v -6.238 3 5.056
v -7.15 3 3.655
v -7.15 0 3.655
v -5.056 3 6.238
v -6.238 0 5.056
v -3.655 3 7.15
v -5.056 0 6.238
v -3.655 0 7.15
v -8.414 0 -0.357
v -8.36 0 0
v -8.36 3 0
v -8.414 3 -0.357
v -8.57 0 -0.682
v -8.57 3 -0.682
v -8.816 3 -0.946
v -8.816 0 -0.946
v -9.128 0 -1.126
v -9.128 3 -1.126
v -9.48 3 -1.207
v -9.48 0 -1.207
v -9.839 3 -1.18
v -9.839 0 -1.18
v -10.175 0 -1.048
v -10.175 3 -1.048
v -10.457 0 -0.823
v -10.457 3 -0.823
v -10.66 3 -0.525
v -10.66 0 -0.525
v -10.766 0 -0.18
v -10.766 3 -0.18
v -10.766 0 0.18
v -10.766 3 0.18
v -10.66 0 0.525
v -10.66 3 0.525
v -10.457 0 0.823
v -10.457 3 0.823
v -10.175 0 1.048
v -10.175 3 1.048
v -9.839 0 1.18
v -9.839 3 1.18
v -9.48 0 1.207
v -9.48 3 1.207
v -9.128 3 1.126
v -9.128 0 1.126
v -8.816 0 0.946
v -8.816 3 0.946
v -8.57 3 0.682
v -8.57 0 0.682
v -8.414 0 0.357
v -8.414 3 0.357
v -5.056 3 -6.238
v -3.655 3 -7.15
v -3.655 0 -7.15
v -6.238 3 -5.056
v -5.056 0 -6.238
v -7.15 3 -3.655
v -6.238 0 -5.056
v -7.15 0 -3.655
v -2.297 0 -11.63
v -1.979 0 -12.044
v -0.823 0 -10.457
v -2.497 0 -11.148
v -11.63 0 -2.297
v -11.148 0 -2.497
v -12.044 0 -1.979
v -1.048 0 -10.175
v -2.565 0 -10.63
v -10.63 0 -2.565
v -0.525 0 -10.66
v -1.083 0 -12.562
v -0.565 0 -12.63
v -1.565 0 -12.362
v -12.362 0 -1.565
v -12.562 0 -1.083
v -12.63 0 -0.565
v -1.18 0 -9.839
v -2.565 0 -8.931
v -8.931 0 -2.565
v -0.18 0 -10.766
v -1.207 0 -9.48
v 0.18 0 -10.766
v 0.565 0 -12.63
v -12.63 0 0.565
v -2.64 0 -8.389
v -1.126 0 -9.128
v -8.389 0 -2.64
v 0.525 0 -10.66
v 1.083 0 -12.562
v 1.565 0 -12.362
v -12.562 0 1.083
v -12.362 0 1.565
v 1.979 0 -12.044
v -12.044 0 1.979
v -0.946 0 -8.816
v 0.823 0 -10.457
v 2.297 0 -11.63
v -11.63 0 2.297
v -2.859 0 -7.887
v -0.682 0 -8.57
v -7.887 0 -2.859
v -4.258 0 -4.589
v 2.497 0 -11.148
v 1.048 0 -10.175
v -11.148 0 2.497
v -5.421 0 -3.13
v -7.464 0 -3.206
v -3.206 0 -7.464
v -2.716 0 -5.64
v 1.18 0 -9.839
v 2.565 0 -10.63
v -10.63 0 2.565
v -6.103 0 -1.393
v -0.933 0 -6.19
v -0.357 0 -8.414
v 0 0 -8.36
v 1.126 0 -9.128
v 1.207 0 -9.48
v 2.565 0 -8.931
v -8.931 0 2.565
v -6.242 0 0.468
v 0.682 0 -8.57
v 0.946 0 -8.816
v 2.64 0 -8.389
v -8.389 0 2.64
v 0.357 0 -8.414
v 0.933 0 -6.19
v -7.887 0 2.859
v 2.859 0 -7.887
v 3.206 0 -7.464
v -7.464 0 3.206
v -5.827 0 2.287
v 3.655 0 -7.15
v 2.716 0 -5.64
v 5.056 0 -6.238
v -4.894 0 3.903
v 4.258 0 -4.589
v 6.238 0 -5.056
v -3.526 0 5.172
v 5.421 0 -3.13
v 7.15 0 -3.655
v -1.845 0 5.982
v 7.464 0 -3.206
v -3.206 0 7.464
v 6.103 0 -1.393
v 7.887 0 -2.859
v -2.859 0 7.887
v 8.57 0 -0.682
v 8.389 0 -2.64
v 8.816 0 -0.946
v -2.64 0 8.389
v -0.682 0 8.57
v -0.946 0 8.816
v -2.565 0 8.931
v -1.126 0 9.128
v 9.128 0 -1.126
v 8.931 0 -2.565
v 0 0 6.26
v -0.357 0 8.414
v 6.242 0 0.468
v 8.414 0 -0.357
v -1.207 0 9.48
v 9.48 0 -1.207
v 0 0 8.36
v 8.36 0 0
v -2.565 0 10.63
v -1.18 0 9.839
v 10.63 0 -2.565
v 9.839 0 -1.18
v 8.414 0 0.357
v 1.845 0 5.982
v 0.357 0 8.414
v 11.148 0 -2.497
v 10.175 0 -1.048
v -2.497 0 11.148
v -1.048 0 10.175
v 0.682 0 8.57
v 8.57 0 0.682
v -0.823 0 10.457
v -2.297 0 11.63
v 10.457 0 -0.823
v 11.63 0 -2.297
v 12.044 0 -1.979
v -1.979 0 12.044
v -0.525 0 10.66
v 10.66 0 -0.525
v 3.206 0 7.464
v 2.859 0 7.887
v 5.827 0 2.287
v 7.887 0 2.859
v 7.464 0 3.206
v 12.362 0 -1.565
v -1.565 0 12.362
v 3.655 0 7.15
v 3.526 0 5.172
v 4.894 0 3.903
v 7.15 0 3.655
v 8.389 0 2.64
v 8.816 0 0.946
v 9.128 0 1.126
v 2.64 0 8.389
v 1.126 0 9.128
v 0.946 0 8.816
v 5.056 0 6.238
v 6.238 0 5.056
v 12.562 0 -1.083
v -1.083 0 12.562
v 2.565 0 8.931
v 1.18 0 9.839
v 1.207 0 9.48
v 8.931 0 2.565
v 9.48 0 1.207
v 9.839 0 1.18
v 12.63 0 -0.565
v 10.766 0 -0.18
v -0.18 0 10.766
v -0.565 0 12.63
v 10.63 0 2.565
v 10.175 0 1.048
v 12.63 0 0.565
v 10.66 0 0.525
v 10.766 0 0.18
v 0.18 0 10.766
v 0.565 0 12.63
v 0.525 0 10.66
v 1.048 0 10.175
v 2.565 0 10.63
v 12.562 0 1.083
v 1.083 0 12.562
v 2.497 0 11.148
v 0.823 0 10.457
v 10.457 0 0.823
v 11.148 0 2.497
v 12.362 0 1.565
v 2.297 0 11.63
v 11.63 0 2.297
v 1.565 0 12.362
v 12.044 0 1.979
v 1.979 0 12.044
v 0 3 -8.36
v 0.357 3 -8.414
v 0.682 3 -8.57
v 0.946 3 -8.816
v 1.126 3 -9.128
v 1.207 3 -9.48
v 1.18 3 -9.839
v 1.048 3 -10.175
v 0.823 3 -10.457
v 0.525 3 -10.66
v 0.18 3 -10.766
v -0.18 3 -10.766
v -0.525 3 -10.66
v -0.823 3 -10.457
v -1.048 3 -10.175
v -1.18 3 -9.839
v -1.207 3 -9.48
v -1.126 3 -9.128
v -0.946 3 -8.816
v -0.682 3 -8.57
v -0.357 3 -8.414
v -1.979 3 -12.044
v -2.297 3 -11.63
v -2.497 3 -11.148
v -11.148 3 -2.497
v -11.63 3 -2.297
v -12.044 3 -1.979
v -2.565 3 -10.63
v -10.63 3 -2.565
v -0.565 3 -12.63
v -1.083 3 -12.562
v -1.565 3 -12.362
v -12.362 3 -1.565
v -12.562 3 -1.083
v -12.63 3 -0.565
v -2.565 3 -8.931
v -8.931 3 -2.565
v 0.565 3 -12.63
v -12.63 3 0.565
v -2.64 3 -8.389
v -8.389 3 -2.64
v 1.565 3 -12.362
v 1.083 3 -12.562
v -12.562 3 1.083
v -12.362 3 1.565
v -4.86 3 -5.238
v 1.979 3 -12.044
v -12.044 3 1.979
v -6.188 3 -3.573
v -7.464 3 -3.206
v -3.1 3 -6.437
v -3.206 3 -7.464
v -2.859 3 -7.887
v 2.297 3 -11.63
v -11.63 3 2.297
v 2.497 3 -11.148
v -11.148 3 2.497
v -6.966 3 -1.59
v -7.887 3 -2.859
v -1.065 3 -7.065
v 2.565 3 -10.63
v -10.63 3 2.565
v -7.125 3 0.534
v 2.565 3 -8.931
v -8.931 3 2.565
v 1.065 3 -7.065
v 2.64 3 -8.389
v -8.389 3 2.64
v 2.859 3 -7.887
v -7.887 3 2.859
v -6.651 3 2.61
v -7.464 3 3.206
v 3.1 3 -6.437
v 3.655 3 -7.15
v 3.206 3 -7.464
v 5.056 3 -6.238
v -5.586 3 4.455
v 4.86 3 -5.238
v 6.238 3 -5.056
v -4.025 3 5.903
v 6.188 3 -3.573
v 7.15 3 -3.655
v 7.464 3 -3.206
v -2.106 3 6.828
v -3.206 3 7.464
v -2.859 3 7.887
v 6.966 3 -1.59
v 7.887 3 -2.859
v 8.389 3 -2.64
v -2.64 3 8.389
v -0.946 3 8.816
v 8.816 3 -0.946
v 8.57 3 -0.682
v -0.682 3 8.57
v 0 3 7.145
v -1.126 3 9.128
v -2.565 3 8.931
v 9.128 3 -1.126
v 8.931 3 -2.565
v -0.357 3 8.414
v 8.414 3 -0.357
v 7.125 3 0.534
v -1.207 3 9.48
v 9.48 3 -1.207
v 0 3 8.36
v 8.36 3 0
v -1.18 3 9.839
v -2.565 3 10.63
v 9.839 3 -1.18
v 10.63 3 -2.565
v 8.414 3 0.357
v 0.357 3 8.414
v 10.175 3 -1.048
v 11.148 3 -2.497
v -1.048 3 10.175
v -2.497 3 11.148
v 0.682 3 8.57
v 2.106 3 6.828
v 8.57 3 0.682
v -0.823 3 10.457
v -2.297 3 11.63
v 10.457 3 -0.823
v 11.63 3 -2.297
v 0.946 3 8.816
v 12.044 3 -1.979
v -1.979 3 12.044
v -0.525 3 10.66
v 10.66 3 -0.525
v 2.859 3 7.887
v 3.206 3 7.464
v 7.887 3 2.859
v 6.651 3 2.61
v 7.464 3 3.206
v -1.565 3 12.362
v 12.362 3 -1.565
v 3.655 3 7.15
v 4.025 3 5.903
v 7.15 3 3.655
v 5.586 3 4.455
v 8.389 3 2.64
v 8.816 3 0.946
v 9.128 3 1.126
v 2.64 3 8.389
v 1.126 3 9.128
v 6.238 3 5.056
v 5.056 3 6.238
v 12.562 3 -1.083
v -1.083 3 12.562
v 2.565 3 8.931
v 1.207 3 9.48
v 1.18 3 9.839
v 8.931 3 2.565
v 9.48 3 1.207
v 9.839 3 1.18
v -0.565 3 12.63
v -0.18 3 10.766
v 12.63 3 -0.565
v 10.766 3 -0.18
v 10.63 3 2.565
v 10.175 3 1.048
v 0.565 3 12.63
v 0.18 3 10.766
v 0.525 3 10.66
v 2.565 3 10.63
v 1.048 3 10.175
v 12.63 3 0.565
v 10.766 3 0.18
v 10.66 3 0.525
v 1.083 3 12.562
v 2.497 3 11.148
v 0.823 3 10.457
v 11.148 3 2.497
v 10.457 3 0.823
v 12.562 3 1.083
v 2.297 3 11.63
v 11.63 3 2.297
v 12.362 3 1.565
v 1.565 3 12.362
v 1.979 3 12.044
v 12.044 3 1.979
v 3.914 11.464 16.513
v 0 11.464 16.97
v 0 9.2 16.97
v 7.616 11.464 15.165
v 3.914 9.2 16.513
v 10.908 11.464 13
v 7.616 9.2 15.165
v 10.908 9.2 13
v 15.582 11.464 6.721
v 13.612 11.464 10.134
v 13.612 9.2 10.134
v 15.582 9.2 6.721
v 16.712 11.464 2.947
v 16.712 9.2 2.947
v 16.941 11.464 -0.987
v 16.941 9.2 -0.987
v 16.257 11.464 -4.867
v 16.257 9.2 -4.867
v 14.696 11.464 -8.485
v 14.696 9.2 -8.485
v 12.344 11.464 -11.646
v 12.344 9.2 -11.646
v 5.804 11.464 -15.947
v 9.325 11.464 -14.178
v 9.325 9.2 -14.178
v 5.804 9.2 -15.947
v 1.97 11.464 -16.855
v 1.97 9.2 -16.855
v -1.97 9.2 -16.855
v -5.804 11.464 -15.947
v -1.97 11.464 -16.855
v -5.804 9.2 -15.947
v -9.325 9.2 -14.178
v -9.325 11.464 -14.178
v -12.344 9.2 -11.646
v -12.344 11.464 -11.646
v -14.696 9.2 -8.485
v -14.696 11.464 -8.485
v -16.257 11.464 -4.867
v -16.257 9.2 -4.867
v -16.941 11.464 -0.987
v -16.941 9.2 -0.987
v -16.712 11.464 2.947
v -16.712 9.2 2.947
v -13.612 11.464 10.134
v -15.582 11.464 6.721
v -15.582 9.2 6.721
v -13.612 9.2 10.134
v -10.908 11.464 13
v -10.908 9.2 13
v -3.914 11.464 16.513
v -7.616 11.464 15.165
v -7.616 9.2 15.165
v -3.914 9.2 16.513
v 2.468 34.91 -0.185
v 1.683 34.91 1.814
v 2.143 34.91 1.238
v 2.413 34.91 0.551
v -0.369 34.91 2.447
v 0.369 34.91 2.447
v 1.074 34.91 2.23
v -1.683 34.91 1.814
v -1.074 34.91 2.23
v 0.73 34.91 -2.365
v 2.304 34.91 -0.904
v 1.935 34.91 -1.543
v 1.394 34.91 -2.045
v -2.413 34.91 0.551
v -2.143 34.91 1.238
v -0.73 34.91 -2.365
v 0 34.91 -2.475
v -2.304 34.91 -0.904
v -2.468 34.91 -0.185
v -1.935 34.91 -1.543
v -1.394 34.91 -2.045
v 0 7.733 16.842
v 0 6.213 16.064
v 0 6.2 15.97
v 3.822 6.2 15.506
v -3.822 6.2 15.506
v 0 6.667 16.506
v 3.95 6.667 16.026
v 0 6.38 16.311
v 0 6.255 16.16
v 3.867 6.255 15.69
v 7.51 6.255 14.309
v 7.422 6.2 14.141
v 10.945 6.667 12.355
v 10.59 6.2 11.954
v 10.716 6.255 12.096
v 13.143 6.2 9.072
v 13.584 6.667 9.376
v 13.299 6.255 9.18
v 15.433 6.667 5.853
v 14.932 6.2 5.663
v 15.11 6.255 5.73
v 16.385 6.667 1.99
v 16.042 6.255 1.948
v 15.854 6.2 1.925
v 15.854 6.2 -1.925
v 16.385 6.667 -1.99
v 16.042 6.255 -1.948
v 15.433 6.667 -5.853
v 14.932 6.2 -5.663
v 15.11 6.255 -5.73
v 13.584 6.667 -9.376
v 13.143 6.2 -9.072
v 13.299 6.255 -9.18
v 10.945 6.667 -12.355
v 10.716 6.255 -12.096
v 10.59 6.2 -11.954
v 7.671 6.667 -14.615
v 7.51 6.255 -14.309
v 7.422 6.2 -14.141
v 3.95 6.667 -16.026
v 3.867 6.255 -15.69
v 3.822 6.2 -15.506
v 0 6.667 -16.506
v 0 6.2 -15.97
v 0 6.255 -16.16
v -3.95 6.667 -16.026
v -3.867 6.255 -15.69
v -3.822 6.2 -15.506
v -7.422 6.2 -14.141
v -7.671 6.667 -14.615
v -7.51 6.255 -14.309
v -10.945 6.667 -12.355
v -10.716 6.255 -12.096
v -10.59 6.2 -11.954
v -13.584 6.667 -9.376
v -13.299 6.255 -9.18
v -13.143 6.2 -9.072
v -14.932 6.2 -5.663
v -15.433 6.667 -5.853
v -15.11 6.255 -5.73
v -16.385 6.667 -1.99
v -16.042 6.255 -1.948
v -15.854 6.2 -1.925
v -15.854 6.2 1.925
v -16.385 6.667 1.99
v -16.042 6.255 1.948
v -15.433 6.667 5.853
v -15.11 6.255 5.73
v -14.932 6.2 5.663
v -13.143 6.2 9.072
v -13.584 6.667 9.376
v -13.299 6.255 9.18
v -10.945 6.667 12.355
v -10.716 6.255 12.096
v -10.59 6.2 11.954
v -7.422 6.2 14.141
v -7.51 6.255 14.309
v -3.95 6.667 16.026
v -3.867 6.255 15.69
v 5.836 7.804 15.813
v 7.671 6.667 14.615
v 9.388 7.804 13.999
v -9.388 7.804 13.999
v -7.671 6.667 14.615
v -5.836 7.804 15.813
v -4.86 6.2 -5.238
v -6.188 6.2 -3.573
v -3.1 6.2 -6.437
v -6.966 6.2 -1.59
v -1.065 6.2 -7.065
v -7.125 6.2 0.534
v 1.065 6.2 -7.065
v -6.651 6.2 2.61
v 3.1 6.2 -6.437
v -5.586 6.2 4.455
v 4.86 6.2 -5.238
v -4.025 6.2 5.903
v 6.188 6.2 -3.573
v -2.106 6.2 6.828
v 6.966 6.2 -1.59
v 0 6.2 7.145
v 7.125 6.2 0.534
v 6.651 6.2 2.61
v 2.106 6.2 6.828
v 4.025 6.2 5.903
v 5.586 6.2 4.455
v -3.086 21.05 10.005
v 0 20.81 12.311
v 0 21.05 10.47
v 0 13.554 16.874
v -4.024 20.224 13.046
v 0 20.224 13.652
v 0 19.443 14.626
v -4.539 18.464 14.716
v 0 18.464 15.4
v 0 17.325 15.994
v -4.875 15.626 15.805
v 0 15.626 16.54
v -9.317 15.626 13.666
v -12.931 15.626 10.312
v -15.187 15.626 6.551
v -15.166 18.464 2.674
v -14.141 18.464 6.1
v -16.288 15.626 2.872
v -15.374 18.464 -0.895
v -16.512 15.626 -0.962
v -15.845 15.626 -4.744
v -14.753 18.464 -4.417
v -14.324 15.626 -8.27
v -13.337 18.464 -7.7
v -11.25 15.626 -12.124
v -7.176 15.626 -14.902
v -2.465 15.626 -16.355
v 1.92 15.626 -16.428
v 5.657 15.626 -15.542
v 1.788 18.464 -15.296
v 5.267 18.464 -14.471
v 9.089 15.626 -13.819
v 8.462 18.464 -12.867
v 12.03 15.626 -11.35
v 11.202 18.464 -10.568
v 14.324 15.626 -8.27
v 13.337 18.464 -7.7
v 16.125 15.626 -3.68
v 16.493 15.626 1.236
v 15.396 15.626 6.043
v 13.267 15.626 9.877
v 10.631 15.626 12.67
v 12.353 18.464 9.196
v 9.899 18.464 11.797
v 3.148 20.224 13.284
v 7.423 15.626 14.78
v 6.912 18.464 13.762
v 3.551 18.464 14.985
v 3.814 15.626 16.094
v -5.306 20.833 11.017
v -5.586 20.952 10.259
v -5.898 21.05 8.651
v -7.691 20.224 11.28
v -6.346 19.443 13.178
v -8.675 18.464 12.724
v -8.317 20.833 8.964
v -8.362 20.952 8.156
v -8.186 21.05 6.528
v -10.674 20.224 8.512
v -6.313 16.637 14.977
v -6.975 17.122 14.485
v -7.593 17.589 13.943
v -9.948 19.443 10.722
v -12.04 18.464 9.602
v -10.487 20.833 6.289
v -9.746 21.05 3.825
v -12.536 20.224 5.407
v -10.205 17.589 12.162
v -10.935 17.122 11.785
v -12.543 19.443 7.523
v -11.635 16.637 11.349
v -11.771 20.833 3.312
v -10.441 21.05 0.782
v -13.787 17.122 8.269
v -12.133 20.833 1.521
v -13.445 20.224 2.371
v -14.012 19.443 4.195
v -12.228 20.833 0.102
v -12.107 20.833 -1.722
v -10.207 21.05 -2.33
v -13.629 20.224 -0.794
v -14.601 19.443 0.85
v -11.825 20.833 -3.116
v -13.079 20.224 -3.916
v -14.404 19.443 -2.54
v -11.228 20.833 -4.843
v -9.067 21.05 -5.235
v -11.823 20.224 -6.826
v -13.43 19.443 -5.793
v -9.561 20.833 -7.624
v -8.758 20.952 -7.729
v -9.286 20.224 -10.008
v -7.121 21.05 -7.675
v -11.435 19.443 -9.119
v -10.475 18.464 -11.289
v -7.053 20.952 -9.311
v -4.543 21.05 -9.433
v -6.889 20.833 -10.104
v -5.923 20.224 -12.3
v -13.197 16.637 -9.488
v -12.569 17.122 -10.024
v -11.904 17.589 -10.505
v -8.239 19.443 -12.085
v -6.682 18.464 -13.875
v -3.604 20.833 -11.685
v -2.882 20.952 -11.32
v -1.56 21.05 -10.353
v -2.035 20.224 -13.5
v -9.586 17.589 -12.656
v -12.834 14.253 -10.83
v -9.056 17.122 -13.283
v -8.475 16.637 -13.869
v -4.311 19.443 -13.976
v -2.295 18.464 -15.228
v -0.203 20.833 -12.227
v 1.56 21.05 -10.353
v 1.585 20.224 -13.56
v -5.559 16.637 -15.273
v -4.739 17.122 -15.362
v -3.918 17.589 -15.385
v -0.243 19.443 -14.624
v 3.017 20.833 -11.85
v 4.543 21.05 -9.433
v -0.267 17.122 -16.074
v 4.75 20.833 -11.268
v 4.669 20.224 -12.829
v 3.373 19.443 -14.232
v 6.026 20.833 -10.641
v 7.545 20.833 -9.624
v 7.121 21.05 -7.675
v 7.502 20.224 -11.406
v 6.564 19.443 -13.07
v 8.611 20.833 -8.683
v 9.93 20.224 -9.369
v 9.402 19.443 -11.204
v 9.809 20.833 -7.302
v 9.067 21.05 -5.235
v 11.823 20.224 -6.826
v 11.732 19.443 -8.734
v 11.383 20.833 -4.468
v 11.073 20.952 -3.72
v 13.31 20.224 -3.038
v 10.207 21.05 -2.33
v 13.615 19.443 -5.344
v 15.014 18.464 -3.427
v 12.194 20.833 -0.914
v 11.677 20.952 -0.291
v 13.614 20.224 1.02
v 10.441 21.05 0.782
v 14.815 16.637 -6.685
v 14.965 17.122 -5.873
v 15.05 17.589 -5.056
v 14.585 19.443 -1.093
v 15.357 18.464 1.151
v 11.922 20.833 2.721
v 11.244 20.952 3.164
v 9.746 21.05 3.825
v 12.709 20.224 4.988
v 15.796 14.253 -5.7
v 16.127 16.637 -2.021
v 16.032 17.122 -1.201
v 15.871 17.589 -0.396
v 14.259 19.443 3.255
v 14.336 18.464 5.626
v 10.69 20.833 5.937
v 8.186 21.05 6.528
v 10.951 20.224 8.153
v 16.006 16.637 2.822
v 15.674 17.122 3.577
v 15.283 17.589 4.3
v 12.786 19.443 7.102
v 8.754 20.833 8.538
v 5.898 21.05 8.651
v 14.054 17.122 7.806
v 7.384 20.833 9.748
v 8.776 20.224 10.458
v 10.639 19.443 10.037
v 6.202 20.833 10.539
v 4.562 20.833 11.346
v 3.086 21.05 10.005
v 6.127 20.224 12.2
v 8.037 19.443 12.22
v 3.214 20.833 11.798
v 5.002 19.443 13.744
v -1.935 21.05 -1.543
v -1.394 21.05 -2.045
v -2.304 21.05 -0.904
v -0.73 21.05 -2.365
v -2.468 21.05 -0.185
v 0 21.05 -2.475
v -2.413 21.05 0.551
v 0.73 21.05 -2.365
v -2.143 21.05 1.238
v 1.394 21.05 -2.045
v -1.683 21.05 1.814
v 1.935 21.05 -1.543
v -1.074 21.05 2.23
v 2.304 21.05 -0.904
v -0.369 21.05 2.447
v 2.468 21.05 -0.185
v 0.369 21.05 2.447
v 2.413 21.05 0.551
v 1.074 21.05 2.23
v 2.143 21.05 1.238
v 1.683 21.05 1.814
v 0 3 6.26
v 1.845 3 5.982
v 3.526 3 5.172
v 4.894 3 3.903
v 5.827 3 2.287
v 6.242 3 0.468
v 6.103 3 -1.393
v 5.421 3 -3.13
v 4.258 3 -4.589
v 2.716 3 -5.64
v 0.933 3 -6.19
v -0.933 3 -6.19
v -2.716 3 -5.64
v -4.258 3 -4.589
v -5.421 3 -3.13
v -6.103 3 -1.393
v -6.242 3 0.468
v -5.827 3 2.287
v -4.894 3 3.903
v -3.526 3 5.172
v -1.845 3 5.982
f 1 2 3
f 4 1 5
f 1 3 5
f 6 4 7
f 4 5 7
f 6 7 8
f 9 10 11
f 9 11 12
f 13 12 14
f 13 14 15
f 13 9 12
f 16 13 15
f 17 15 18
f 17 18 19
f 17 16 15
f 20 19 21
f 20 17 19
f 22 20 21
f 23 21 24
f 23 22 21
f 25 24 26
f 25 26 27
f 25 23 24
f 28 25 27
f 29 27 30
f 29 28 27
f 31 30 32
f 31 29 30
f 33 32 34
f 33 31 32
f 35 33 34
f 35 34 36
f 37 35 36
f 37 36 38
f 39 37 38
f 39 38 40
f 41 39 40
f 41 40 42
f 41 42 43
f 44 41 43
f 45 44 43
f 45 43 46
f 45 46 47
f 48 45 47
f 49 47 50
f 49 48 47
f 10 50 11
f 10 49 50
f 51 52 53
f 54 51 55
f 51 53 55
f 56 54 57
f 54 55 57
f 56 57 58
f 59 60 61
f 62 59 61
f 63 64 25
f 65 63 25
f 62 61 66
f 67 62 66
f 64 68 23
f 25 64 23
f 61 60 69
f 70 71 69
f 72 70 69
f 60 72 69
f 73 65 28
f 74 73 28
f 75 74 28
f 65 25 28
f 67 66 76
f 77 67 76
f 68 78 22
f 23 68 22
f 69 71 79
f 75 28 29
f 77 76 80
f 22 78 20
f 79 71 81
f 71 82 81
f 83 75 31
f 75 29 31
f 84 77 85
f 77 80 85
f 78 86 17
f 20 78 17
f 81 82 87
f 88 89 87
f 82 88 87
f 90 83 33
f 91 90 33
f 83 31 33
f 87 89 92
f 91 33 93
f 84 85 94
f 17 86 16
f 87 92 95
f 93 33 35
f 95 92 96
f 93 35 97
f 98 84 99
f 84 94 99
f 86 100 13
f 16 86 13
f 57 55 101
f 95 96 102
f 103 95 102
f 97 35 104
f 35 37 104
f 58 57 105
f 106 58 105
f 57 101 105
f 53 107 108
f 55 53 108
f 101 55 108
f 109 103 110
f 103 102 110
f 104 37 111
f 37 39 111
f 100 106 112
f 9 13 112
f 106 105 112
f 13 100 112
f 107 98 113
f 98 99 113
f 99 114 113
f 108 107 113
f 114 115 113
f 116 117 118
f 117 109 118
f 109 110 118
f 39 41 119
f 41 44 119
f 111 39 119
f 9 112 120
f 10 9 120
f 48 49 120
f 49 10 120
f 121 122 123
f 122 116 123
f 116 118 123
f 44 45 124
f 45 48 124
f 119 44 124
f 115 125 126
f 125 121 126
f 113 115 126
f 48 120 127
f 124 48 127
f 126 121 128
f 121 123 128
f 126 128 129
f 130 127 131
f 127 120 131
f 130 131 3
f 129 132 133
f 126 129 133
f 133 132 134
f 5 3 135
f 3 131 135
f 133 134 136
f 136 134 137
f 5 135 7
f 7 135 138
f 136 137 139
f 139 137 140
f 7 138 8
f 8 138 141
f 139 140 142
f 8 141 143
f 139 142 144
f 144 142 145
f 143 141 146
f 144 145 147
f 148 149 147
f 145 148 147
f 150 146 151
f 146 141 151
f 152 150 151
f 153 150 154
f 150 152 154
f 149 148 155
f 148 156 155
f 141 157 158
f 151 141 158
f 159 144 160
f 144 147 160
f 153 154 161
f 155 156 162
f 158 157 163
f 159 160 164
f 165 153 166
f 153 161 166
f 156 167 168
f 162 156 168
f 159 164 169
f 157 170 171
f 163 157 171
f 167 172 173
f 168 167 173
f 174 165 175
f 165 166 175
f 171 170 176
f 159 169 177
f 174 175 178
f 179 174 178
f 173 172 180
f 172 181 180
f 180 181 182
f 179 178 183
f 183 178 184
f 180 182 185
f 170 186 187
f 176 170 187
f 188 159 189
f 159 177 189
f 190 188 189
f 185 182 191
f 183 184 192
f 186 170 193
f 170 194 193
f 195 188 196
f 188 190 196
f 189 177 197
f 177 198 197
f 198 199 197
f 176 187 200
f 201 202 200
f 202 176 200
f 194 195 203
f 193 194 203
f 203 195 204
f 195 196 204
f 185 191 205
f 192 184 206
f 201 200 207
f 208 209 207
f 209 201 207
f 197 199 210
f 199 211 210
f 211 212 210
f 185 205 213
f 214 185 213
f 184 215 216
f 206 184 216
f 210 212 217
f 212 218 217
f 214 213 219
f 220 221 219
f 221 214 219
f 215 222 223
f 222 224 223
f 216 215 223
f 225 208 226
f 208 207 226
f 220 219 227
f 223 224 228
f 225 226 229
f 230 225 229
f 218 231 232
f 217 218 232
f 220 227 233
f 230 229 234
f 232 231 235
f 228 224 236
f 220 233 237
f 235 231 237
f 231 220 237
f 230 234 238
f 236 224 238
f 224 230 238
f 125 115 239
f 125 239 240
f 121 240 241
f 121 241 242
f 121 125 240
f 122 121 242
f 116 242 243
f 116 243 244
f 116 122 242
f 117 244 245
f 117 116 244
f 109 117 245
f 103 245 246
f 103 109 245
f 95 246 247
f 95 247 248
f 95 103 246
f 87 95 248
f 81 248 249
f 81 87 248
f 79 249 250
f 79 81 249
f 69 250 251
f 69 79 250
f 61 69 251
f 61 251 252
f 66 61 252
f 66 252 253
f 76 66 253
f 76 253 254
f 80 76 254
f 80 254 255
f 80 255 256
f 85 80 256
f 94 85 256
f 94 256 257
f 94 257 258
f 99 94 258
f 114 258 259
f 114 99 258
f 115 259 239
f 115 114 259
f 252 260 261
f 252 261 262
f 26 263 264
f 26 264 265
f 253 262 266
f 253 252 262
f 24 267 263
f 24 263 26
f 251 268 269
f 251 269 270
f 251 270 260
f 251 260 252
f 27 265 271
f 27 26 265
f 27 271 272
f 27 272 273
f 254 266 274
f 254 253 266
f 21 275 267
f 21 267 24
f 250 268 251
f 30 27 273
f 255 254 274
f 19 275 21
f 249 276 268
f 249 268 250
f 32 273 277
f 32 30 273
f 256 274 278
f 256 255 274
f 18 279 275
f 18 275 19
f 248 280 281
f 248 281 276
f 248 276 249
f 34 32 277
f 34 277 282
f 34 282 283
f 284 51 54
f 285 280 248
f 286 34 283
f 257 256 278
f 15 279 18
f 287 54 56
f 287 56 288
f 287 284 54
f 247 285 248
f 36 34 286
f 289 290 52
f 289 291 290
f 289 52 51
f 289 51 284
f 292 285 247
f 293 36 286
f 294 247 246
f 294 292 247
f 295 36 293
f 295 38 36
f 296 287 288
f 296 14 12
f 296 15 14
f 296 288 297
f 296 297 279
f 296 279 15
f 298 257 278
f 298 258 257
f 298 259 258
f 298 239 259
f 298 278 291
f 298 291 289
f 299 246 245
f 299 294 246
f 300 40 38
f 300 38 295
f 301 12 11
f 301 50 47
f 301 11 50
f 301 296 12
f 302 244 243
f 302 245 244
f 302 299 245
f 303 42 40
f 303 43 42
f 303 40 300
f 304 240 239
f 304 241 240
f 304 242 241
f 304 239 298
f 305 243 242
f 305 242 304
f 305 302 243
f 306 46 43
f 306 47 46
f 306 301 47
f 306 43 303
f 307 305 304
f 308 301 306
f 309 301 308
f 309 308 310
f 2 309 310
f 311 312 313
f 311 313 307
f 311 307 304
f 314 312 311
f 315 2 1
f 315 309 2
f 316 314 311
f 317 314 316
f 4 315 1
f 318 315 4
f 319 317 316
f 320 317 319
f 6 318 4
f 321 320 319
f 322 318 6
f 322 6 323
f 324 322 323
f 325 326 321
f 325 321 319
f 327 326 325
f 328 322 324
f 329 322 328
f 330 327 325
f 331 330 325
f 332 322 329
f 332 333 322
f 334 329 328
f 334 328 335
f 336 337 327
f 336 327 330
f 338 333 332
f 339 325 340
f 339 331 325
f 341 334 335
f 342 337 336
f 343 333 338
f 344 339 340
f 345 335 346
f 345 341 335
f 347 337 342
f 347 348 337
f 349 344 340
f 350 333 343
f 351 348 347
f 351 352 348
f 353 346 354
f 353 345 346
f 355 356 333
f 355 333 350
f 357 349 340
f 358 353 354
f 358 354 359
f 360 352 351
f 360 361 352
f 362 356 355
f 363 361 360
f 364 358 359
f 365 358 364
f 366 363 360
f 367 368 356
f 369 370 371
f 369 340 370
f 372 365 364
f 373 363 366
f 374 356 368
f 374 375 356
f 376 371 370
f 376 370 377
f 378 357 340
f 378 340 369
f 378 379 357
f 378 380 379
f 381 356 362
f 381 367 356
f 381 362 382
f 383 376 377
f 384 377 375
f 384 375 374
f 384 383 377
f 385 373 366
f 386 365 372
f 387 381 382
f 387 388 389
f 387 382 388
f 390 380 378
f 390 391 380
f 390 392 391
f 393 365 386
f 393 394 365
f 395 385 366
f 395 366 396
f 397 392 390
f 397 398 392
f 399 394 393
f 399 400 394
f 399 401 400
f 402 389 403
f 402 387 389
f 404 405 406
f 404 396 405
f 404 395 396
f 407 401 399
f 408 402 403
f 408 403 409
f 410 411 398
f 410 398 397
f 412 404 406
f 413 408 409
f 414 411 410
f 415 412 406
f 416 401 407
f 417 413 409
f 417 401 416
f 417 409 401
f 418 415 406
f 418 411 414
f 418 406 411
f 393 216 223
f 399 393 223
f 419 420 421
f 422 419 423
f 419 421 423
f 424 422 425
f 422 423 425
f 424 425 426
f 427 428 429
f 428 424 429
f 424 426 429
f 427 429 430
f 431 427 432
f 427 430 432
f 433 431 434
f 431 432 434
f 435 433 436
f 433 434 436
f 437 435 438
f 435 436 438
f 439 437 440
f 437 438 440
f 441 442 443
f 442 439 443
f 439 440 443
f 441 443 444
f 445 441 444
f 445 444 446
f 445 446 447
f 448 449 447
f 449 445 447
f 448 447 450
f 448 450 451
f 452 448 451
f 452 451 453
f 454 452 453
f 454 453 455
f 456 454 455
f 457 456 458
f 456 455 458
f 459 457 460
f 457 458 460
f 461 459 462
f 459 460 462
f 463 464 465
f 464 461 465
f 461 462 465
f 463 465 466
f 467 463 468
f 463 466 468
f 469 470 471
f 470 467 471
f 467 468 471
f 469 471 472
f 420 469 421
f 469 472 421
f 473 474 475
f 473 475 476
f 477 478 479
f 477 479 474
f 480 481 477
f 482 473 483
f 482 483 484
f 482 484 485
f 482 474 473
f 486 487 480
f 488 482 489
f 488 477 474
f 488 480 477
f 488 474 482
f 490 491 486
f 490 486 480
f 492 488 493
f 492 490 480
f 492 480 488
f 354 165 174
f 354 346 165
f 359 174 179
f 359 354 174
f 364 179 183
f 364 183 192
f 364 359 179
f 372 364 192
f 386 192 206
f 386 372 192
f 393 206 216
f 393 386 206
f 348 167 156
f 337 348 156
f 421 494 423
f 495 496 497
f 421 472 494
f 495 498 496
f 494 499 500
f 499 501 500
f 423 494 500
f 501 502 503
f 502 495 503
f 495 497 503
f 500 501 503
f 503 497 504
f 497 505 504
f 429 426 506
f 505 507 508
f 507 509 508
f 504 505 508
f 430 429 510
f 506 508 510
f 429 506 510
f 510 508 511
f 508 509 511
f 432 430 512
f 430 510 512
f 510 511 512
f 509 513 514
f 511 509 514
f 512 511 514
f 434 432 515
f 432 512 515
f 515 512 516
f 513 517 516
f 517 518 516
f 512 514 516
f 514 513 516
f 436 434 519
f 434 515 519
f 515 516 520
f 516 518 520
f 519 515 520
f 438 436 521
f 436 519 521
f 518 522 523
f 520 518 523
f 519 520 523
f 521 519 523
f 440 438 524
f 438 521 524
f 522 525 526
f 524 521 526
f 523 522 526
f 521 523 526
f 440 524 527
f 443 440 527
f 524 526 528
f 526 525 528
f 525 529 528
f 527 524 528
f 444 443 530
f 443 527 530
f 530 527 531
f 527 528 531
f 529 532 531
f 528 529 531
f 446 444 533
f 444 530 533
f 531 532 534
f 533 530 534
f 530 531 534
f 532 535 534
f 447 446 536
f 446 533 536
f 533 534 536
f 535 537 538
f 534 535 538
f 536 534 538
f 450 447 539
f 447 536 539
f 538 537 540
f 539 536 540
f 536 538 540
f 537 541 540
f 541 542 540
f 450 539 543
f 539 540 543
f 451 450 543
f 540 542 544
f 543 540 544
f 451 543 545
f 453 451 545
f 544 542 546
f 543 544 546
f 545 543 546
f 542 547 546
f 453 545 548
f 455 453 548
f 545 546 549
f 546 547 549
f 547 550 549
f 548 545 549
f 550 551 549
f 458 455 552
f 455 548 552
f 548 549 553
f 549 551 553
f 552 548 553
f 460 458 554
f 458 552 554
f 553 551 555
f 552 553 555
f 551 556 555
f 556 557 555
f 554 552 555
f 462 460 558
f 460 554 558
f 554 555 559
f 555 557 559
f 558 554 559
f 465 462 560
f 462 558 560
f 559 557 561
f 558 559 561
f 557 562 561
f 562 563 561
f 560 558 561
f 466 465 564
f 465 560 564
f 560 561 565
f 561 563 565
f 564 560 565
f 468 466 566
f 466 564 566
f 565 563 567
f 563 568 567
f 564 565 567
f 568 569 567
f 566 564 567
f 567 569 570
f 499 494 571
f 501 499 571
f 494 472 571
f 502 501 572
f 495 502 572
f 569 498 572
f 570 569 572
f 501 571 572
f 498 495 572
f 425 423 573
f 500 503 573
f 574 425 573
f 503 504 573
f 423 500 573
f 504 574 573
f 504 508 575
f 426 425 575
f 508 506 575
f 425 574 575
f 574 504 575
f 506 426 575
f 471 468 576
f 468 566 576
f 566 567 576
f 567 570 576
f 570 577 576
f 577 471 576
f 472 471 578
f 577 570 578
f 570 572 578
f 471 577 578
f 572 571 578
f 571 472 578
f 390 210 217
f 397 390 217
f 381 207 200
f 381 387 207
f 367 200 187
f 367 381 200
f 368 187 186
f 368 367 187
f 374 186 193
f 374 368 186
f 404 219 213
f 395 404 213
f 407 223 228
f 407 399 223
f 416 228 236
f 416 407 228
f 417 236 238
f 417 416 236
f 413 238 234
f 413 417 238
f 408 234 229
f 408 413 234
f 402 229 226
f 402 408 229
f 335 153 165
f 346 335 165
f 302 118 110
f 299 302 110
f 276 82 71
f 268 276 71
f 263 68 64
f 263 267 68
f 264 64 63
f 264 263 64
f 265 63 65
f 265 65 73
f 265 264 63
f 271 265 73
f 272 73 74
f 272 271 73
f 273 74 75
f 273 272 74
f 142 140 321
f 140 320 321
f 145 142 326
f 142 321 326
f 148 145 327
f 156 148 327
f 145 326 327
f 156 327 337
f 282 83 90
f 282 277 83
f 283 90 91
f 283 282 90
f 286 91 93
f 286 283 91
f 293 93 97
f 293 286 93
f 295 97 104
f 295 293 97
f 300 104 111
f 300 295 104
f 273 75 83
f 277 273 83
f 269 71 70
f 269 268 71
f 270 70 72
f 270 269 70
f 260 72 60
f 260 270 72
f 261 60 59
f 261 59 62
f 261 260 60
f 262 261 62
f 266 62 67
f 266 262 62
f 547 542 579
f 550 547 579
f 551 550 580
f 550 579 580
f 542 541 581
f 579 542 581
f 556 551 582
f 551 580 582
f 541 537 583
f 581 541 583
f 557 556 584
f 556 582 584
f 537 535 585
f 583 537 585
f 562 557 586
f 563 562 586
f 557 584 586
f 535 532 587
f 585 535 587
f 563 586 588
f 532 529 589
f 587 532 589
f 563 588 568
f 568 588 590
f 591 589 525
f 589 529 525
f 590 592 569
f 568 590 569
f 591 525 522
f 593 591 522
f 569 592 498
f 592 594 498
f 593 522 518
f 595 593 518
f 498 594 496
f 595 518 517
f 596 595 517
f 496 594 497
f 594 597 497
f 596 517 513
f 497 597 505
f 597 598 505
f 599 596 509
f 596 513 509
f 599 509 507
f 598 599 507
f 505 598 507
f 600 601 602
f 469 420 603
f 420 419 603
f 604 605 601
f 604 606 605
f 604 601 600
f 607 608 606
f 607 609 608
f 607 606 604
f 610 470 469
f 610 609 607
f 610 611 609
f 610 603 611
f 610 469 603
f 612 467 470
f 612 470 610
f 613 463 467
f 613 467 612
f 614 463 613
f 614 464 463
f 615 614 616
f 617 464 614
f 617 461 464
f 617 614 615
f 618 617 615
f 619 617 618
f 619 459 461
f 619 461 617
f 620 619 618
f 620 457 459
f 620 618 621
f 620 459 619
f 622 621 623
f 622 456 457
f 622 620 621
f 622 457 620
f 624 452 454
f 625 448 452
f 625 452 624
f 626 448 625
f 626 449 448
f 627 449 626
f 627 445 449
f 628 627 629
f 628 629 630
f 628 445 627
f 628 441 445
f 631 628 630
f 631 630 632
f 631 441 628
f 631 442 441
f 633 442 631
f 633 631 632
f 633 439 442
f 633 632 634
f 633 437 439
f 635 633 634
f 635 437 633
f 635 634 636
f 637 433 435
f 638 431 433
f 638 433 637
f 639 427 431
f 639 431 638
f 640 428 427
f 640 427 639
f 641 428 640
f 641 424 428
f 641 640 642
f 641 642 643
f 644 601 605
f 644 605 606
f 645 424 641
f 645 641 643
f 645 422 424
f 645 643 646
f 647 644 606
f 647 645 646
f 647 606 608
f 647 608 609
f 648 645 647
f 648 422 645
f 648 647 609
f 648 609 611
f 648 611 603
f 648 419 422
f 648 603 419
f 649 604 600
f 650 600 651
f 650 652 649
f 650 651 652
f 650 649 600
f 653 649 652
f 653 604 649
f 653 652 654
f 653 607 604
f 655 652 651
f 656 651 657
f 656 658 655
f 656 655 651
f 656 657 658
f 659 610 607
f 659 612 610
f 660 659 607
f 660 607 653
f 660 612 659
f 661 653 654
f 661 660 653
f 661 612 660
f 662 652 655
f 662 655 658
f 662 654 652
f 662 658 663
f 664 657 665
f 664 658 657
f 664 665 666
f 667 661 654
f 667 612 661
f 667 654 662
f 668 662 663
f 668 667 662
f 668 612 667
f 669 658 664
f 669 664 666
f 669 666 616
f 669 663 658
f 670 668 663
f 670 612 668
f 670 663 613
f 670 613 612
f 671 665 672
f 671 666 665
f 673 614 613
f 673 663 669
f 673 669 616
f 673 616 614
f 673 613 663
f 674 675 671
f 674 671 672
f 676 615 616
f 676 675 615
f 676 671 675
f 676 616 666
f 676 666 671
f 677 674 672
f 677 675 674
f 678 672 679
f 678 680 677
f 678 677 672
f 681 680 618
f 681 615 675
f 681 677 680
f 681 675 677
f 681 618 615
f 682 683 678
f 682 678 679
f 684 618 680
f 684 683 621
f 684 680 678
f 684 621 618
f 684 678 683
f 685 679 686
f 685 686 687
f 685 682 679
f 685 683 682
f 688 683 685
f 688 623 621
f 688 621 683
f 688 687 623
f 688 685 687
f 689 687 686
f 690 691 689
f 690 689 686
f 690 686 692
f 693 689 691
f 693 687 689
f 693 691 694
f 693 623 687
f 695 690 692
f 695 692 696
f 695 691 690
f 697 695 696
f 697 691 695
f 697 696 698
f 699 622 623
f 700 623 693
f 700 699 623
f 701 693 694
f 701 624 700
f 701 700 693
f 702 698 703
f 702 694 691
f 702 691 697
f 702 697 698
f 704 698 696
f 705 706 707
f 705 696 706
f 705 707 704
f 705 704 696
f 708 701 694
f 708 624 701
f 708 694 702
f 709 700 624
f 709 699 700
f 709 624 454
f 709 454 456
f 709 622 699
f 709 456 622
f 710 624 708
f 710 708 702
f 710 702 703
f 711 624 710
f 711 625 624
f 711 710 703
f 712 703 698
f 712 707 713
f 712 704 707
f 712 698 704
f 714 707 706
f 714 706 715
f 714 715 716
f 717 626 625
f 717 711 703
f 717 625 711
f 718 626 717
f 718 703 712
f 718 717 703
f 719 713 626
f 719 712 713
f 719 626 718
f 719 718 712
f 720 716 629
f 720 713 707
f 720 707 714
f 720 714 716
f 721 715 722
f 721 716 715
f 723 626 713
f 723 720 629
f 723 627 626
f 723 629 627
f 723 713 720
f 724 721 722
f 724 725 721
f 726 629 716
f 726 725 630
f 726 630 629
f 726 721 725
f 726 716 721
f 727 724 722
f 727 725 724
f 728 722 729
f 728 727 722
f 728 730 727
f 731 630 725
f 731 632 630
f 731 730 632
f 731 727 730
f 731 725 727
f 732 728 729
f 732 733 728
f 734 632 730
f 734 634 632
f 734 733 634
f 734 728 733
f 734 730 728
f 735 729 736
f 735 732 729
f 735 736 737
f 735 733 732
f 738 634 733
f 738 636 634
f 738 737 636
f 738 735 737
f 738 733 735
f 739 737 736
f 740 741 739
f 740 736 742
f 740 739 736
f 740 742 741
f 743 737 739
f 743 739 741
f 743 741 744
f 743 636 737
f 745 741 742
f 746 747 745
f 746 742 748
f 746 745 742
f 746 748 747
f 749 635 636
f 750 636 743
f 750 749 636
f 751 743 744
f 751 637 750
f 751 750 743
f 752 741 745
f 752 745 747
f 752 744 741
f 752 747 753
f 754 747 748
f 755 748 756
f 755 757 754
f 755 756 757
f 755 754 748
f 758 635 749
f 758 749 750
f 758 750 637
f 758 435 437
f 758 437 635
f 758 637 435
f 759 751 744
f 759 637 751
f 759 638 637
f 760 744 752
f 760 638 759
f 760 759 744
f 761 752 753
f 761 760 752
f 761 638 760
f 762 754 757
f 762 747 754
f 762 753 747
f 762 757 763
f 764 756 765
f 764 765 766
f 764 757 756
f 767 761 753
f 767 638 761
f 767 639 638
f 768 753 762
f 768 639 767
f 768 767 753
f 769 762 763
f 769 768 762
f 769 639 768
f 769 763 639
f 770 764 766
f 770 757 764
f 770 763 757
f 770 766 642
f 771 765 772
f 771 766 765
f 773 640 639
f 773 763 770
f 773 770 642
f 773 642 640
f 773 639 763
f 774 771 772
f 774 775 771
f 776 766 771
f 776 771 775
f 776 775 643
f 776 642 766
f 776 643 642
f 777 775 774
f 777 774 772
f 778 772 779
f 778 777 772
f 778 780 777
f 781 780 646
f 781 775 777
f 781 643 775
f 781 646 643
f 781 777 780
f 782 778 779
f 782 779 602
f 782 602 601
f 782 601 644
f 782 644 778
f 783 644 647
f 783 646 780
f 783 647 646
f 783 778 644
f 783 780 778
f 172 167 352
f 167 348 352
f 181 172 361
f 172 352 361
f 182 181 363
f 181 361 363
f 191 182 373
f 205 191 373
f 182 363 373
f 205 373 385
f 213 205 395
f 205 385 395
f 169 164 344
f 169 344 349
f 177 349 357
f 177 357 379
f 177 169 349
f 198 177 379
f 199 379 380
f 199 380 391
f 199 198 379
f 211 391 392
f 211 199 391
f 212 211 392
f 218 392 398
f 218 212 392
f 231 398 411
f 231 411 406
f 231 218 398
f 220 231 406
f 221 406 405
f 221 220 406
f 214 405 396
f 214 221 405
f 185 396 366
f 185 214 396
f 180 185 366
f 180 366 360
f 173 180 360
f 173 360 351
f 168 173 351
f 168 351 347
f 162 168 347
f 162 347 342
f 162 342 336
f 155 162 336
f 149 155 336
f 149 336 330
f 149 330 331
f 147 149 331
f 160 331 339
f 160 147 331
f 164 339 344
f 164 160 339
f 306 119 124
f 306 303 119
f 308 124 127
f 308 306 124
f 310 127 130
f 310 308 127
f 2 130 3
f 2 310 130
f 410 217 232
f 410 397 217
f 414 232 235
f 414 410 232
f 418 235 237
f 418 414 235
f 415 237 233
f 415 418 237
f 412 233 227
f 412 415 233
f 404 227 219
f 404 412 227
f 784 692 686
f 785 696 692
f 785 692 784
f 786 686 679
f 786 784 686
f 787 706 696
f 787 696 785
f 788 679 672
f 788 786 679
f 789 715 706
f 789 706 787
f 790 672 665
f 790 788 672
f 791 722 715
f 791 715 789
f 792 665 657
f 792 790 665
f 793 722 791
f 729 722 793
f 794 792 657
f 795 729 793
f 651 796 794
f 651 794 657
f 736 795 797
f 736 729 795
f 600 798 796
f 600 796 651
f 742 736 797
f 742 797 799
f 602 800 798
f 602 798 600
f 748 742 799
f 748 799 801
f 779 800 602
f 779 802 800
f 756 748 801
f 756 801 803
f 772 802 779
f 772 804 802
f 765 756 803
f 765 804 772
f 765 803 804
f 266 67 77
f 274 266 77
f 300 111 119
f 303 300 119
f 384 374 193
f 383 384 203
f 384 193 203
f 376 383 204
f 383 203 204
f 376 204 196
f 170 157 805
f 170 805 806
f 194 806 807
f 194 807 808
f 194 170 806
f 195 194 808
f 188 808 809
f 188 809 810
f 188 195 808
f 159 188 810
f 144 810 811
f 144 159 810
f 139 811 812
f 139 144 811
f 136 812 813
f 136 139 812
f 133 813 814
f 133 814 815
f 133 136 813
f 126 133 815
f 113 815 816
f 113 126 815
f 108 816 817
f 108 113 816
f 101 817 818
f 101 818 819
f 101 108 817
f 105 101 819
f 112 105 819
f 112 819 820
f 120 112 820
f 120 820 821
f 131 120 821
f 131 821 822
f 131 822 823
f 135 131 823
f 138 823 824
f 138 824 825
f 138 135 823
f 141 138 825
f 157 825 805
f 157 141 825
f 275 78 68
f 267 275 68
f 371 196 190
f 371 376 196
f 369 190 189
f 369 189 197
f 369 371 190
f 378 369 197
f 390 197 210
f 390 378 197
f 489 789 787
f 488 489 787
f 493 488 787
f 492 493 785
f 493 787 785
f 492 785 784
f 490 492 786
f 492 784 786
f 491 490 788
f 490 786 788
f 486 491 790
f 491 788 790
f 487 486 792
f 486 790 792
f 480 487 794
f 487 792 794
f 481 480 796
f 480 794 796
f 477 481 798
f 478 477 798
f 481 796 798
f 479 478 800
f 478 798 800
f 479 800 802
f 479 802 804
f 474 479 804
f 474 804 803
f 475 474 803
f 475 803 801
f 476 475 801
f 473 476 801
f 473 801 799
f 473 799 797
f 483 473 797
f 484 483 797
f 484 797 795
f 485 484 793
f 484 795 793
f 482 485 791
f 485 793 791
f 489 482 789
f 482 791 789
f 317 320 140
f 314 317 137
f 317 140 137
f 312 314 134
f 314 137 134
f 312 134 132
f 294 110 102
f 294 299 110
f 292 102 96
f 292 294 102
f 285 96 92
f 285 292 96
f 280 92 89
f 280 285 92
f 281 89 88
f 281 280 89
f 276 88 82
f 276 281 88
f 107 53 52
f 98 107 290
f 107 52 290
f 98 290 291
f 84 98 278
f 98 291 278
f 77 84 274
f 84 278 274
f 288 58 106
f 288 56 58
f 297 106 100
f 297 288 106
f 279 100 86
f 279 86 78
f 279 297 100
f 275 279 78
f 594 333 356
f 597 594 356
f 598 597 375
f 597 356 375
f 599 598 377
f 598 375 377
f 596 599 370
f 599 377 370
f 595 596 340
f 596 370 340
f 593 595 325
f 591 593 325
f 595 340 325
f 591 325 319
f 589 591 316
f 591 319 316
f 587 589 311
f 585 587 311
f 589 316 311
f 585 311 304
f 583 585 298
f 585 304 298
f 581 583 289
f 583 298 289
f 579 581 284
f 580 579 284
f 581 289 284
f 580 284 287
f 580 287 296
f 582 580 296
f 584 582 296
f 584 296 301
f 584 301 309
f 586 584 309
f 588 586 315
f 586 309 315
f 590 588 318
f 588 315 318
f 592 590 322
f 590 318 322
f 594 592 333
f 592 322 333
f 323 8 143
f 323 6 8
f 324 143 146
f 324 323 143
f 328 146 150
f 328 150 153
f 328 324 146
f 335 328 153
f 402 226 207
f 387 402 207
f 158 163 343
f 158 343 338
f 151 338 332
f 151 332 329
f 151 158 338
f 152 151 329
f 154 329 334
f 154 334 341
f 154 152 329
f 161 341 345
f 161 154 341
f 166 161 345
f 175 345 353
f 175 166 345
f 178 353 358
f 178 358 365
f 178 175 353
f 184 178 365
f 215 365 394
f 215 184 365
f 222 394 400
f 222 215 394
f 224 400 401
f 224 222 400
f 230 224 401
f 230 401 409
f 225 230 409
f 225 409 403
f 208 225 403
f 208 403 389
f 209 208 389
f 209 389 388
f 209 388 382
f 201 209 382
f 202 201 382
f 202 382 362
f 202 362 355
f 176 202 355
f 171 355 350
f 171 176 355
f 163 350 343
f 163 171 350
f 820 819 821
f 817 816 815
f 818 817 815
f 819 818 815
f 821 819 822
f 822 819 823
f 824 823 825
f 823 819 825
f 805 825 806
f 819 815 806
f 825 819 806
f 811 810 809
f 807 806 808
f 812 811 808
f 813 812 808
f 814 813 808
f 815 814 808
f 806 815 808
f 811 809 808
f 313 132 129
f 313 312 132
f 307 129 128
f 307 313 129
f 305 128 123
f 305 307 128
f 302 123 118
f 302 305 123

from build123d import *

# Parameters (mm, degrees)
SKETCH1_R                = 8.03
SKETCH1_R_2              = 6.26
BOSS_EXTRUDE1_DEPTH      = 3
SKETCH1_4_R              = 1.21
BOSS_EXTRUDE3_DEPTH      = 3
FILLET1_R                = 2
CIRPATTERN1_COUNT        = 4
FILLET1_OF_CIRPATTERN1_R = 2
BOSS_EXTRUDE4_START      = 3
SKETCH1_5_R              = 7.145
SKETCH1_5_R_2            = 6.26
SKETCH1_5_R_3            = 2.475
BOSS_EXTRUDE4_DEPTH      = 3.2
BOSS_EXTRUDE5_START      = 6.2
SKETCH1_6_R              = 16.97
BOSS_EXTRUDE5_DEPTH      = 14.85
BOSS_EXTRUDE6_START      = 21.05
SKETCH1_7_R              = 2.475
BOSS_EXTRUDE6_DEPTH      = 13.86
FILLET3_SIZE             = 3
FILLET3_SIZE_2           = 1


with BuildPart() as part:
    # Sketch1 → Boss-Extrude1 (new body)
    with BuildSketch(Plane(origin=(0, 0, 0), x_dir=(1, 0, 0), z_dir=(0, 1, 0))):
        with Locations(Location((0, 0, 0), (0, 0, 270))):
            Circle(SKETCH1_R)
        with Locations(Location((0, 0, 0), (0, 0, 270))):
            Circle(SKETCH1_R_2, mode=Mode.SUBTRACT)
    extrude(amount=BOSS_EXTRUDE1_DEPTH)

    # Sketch1<4> → Boss-Extrude3 (add)
    with BuildSketch(Plane(origin=(0, 0, 0), x_dir=(1, 0, 0), z_dir=(0, 1, 0))):
        with BuildLine():
            Line((-2.565, 12.63), (-2.565, 7.609315015))
            ThreePointArc((-2.565, 7.609315015), (0, 8.03), (2.565, 7.609315015))
            Line((2.565, 7.609315015), (2.565, 12.63))
            Line((2.565, 12.63), (-2.565, 12.63))
        make_face()
        with Locations(Location((0, 9.57, 0), (0, 0, 270))):
            Circle(SKETCH1_4_R, mode=Mode.SUBTRACT)
    boss_extrude3 = extrude(amount=BOSS_EXTRUDE3_DEPTH)

    # Fillet1
    fillet1_edges = [part.edges().sort_by_distance(p)[0] for p in [
        (-2.565, 1.5, -7.609315015),
        (2.565, 1.5, -7.609315015),
        (2.565, 1.5, -12.63),
        (-2.565, 1.5, -12.63),
    ]]
    fillet(fillet1_edges, radius=FILLET1_R)

    # CirPattern1: Boss-Extrude3 ×4 about axis
    cirpattern1_axis = Axis((0, 0, 0), (0, 1, 0))
    for i in range(1, CIRPATTERN1_COUNT):
        add(boss_extrude3.rotate(cirpattern1_axis, i * 360 / CIRPATTERN1_COUNT))

    # Fillet1 of CirPattern1
    fillet1_of_cirpattern1_edges = [part.edges().sort_by_distance(p)[0] for p in [
        (-7.609315015, 1.5, 2.565),
        (-7.609315015, 1.5, -2.565),
        (-12.63, 1.5, -2.565),
        (-12.63, 1.5, 2.565),
        (2.565, 1.5, 7.609315015),
        (-2.565, 1.5, 7.609315015),
        (-2.565, 1.5, 12.63),
        (2.565, 1.5, 12.63),
        (7.609315015, 1.5, -2.565),
        (7.609315015, 1.5, 2.565),
        (12.63, 1.5, 2.565),
        (12.63, 1.5, -2.565),
    ]]
    fillet(fillet1_of_cirpattern1_edges, radius=FILLET1_OF_CIRPATTERN1_R)

    # Sketch1<5> → Boss-Extrude4 (add)
    # profile 1 of 3: a face of its own
    with BuildSketch(Plane(origin=(0, 0, 0), x_dir=(1, 0, 0), z_dir=(0, 1, 0)).offset(BOSS_EXTRUDE4_START)):
        with Locations(Location((0, 0, 0), (0, 0, 270))):
            Circle(SKETCH1_5_R)
        with Locations(Location((0, 0, 0), (0, 0, 270))):
            Circle(SKETCH1_5_R_2, mode=Mode.SUBTRACT)
    # profile 2 of 3: a face of its own
    with BuildSketch(Plane(origin=(0, 0, 0), x_dir=(1, 0, 0), z_dir=(0, 1, 0)).offset(BOSS_EXTRUDE4_START)):
        with Locations(Location((0, 0, 0), (0, 0, 270))):
            Circle(SKETCH1_5_R_2)
        Circle(SKETCH1_5_R_3, mode=Mode.SUBTRACT)
    # profile 3 of 3: a face of its own
    with BuildSketch(Plane(origin=(0, 0, 0), x_dir=(1, 0, 0), z_dir=(0, 1, 0)).offset(BOSS_EXTRUDE4_START)):
        Circle(SKETCH1_5_R_3)
    extrude(amount=BOSS_EXTRUDE4_DEPTH)

    # Sketch1<6> → Boss-Extrude5 (add)
    with BuildSketch(Plane(origin=(0, 0, 0), x_dir=(1, 0, 0), z_dir=(0, 1, 0)).offset(BOSS_EXTRUDE5_START)):
        with Locations(Location((0, 0, 0), (0, 0, 270))):
            Circle(SKETCH1_6_R)
    extrude(amount=BOSS_EXTRUDE5_DEPTH)

    # Sketch1<7> → Boss-Extrude6 (add)
    with BuildSketch(Plane(origin=(0, 0, 0), x_dir=(1, 0, 0), z_dir=(0, 1, 0)).offset(BOSS_EXTRUDE6_START)):
        with Locations(Location((0, 0, 0), (0, 0, 90))):
            Circle(SKETCH1_7_R)
    extrude(amount=BOSS_EXTRUDE6_DEPTH)

    # Sketch2 → Cut-Revolve2 (revolve, cut)
    with BuildSketch(Plane.XY, mode=Mode.PRIVATE) as cut_revolve2_sk:
        with BuildLine():
            add(Edge.make_bspline(
                [(10.47, 21.05), (15.814758039, 21.05), (16.969999933, 15.844909447), (16.97, 11.464372124)],
                knots=[0, 0, 0, 0, 0.661851635, 0.661851635, 0.661851635, 0.661851635], degree=3))
            Line((16.97, 11.464372124), (16.97, 21.05))
            Line((16.97, 21.05), (10.47, 21.05))
        make_face()
    revolve(cut_revolve2_sk.sketch.rotate(Axis((0, 21.05, 0), (0, -1, 0)), 90), axis=Axis((0, 21.05, 0), (0, -1, 0)), mode=Mode.SUBTRACT)

    # Fillet3
    # an asymmetric fillet: 3, 1 mm, written as the material it takes off along each edge
    with BuildSketch(Plane(origin=(0, 6.2, 0), x_dir=(0, 0, 1), z_dir=(-1, 0, 0))) as fillet3_piece_1:
        with BuildLine():
            Bezier((16.97, FILLET3_SIZE), (16.97, 0), (16.97 - FILLET3_SIZE_2, 0), weights=[1, 0.707106781, 1])
            Line((16.97 - FILLET3_SIZE_2, 0), (16.97, 0))
            Line((16.97, 0), (16.97, FILLET3_SIZE))
        make_face()
    revolve(axis=Axis((0, 6.2, 0), (0, 1, 0)), mode=Mode.SUBTRACT)


solid = part.part
